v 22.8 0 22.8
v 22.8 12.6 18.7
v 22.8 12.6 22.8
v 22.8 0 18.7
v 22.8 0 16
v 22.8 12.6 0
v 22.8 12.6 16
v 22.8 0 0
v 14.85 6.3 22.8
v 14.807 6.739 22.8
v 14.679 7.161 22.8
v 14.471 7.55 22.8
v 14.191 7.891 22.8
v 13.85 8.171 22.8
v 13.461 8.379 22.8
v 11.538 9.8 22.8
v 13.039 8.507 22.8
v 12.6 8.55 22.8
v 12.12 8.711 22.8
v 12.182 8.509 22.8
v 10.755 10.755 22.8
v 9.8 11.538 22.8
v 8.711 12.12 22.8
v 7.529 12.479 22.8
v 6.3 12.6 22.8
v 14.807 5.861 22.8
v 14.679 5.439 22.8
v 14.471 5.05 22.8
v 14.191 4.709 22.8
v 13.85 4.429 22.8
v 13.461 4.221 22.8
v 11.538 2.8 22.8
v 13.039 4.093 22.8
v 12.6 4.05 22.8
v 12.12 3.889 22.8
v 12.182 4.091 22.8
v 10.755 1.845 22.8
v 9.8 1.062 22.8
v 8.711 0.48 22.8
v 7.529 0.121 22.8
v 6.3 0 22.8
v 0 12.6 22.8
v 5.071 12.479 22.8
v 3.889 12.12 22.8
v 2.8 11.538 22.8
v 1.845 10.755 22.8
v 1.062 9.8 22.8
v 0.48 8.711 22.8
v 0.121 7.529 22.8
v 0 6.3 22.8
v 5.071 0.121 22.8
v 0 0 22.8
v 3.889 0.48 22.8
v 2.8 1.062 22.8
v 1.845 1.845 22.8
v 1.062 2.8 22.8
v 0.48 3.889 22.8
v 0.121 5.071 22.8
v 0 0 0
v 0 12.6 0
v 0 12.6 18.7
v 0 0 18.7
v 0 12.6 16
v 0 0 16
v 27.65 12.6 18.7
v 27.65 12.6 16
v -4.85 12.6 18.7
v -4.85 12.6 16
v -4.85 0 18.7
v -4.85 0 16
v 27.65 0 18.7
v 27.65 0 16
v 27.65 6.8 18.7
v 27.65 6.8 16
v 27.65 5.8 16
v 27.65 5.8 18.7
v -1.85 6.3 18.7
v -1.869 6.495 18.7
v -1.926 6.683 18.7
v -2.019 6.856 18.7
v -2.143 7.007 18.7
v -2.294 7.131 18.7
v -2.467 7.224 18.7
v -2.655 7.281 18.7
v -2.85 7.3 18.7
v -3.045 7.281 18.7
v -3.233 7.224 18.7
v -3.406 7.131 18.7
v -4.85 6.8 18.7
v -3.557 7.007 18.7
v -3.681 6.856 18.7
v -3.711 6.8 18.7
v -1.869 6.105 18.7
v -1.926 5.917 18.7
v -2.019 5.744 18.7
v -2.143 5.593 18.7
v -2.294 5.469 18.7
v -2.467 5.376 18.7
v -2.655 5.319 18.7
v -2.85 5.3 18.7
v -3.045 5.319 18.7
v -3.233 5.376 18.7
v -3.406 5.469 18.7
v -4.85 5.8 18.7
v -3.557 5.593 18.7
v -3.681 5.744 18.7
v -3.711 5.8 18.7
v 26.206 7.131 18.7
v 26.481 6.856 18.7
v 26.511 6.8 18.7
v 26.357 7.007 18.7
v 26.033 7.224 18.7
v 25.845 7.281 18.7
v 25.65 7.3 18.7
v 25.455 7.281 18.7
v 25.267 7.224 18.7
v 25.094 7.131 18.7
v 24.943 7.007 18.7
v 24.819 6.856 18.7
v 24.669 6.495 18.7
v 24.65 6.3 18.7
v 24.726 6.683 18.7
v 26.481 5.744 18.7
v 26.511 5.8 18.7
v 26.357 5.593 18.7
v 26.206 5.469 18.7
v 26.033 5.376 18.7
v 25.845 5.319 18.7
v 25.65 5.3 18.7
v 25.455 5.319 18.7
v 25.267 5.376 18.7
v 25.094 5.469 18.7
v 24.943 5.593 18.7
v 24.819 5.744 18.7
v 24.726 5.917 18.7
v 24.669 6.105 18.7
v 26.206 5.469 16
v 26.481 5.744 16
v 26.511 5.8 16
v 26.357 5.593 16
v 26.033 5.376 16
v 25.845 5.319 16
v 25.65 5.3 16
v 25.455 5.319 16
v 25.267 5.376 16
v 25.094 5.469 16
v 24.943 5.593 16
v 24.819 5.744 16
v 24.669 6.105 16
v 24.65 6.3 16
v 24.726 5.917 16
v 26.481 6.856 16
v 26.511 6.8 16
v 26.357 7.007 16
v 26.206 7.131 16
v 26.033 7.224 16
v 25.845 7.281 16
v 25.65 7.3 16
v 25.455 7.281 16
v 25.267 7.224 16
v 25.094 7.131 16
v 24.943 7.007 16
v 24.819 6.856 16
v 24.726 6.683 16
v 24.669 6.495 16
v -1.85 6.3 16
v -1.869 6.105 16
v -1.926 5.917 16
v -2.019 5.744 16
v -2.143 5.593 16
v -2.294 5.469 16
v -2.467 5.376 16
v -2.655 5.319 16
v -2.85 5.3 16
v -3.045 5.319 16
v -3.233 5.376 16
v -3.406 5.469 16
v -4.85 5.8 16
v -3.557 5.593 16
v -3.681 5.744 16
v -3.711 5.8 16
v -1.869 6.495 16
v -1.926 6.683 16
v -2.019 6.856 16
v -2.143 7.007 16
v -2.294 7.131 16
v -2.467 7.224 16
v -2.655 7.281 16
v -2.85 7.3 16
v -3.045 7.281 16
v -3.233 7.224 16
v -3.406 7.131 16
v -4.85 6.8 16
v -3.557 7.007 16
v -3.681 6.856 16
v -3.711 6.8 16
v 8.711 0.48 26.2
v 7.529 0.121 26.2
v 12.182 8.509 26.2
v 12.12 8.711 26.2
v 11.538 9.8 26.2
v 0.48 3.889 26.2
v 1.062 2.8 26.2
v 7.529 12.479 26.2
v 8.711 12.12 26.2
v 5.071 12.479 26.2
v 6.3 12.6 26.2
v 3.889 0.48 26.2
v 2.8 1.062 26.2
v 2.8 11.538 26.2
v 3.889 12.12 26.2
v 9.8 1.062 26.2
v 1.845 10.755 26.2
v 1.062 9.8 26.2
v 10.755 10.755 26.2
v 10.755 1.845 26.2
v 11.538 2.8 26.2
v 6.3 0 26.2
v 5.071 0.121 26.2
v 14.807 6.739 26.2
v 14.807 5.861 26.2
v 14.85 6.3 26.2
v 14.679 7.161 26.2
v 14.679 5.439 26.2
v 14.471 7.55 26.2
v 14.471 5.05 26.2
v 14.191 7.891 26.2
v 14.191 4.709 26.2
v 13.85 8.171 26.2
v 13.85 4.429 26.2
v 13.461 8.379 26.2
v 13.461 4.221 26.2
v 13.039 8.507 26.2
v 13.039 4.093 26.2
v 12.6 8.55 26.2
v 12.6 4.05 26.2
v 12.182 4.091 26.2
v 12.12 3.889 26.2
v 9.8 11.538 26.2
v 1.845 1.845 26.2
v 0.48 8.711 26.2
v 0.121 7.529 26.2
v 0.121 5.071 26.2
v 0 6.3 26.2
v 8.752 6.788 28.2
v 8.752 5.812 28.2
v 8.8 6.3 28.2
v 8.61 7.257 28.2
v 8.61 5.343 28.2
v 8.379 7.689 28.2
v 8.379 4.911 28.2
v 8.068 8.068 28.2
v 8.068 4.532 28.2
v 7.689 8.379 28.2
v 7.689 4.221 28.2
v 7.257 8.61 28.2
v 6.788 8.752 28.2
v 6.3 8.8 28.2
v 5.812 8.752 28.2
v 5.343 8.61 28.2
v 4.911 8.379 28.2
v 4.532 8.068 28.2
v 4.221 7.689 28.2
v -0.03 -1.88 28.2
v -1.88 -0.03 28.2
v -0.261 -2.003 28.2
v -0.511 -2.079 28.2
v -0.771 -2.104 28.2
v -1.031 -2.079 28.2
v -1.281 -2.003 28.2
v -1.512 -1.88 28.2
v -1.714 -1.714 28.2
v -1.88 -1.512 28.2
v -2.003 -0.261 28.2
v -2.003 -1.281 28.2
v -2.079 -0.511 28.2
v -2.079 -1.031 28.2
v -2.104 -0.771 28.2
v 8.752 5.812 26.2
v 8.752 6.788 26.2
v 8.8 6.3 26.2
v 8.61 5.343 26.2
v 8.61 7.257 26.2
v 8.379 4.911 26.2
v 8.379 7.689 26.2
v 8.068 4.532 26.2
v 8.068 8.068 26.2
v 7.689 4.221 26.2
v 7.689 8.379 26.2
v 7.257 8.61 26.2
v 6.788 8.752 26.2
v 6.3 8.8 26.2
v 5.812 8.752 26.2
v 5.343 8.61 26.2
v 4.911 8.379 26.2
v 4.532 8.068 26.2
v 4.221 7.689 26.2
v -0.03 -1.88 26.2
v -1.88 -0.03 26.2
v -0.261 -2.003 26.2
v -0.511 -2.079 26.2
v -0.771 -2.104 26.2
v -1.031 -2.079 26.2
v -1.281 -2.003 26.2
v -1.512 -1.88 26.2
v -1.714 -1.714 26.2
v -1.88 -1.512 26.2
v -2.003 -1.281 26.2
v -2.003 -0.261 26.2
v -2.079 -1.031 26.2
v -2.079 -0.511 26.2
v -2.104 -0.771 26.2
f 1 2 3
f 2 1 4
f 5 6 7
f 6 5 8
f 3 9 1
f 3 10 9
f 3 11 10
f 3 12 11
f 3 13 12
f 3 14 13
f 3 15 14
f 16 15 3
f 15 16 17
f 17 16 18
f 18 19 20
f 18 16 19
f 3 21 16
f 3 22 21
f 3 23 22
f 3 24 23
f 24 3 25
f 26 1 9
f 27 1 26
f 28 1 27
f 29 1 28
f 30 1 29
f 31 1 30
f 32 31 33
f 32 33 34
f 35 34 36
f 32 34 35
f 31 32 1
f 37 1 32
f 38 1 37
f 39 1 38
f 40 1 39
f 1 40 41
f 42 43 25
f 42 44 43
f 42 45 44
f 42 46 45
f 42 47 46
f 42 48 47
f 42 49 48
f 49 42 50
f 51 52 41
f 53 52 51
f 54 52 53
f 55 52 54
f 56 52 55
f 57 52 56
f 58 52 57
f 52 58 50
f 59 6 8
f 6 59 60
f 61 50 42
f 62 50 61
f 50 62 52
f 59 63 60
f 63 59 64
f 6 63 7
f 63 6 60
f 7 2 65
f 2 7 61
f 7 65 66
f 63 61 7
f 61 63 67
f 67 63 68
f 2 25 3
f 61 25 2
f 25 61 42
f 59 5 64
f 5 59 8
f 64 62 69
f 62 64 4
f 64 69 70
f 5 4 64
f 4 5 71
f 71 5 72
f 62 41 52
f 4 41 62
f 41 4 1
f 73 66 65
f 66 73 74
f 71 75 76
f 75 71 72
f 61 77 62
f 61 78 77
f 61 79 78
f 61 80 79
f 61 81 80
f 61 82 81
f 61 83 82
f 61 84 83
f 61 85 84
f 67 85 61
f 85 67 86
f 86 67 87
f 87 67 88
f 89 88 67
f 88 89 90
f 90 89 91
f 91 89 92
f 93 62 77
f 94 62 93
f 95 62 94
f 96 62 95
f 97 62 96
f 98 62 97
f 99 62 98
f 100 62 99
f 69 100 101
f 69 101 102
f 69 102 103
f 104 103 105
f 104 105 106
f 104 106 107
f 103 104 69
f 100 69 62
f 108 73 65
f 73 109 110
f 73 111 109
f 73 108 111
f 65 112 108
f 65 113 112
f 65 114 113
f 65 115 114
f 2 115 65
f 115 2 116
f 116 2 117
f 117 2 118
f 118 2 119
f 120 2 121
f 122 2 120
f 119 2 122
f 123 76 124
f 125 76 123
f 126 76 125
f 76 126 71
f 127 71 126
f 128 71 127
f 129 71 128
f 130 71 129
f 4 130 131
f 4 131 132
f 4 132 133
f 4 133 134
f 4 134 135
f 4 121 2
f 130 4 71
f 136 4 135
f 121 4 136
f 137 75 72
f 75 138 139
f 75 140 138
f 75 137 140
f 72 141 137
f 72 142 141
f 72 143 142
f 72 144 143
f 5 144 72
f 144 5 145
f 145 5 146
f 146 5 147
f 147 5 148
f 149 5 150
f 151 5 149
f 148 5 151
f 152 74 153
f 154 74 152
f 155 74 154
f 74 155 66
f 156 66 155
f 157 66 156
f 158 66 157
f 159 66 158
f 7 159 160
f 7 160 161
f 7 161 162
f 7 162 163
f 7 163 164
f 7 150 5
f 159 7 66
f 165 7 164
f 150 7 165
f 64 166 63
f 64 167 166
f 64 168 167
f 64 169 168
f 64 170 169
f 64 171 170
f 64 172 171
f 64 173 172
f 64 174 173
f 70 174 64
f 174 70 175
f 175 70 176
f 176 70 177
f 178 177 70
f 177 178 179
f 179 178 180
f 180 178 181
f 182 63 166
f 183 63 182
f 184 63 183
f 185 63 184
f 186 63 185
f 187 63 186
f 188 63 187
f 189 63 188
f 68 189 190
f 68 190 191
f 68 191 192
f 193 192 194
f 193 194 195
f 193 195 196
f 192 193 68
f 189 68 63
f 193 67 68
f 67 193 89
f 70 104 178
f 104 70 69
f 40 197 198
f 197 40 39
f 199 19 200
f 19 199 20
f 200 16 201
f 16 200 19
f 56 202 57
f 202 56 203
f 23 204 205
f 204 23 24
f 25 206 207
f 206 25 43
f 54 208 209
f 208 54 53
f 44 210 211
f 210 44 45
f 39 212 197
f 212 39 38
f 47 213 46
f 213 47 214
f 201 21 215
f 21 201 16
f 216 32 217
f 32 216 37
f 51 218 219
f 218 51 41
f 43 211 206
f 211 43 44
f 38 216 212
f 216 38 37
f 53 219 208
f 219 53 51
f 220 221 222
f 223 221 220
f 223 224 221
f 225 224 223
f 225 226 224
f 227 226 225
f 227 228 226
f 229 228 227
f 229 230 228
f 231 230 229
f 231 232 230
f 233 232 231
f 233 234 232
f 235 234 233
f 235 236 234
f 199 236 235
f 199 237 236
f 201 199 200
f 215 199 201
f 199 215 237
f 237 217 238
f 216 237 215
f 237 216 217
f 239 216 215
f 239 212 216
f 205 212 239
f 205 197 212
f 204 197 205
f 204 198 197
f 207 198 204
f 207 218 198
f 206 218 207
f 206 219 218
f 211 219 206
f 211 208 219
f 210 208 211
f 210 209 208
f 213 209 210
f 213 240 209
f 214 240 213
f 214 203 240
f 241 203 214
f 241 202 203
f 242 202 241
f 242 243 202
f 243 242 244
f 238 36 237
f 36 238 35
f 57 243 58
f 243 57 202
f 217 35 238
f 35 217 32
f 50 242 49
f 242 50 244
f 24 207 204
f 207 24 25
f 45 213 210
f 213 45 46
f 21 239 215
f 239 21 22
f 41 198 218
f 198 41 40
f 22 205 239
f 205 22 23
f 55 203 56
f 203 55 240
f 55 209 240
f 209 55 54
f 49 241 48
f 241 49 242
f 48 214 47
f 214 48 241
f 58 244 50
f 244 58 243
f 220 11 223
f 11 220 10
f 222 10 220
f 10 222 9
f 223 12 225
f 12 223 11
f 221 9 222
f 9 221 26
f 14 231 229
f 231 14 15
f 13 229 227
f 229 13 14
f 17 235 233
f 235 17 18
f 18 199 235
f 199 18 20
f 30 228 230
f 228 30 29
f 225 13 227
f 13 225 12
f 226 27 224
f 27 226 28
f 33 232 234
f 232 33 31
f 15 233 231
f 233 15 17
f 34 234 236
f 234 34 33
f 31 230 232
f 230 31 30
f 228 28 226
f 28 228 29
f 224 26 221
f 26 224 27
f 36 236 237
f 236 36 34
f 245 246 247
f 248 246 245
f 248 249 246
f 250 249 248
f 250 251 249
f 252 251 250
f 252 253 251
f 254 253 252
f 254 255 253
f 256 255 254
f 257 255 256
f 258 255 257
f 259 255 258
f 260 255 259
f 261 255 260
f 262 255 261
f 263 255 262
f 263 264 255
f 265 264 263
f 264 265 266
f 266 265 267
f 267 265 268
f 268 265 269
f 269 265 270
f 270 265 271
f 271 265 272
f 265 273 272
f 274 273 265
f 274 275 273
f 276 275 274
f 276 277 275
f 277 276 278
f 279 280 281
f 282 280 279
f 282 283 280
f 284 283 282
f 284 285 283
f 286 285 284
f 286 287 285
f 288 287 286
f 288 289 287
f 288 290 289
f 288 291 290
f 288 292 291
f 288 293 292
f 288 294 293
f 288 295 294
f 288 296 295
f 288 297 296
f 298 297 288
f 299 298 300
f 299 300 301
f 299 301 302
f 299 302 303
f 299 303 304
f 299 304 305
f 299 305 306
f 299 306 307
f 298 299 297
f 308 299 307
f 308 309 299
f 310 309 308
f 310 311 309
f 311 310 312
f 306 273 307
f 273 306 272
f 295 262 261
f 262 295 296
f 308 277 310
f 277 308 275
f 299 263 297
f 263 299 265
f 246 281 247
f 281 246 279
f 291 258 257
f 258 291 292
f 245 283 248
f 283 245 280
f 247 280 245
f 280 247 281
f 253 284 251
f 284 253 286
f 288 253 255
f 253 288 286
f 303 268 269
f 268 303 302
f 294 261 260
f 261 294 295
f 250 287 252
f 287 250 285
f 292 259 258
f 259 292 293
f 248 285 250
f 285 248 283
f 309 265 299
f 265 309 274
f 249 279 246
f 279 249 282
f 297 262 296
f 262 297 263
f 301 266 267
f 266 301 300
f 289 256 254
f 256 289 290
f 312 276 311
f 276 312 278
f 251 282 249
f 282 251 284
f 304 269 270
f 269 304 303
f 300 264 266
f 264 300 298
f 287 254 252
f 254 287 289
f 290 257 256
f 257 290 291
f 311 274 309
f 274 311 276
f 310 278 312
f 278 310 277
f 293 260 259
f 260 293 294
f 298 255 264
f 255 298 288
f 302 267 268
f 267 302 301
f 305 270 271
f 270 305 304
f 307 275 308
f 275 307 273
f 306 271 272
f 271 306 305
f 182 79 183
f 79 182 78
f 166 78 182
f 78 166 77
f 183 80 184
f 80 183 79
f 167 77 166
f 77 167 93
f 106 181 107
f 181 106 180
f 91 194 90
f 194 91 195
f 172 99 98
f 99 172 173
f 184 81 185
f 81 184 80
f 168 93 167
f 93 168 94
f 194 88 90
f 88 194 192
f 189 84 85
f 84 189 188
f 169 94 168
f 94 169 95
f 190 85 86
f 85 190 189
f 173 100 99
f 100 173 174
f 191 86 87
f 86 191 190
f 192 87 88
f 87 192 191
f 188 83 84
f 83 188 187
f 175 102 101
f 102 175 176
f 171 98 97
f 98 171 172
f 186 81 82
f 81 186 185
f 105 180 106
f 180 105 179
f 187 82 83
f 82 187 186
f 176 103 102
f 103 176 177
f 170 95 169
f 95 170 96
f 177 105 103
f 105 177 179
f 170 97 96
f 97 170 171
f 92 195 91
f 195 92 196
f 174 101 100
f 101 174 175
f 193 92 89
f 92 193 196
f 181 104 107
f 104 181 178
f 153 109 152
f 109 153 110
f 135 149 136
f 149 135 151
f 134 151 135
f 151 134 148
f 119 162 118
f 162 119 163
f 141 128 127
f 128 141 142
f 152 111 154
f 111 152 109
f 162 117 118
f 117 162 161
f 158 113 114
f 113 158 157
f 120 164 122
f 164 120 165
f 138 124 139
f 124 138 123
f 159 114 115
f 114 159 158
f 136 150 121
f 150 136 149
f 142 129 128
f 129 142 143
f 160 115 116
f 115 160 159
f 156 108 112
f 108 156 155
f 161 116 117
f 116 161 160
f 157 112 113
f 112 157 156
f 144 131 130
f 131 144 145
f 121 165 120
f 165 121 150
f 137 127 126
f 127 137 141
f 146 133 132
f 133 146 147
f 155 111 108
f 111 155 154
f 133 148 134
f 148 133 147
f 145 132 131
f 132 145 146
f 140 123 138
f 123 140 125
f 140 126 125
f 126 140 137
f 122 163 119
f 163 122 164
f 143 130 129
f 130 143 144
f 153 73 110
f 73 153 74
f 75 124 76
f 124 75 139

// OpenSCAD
// servoSG90(fn) fn = è la definizione delle curve da usare nel render
module servoSG90(fn) {
//    fn=32;
    L = 22.8;
    l = 12.6;
    h = 22.8;
    plateL = 32.5;
    plateH = 2.7;
    plateHPos = 16;
    topCylinderH = 3.4;
    smallTopCylinderD = 4.5;
    
    axisH = 2;
    axisD = 4;
    
    screwHoleCenter=2;
    screwHoleD=2;
    holeSize=1;
    
    difference() {
        union() {
            color("Blue", 0.7) {
                // main part
                cube([L, l, h]);
                // support
                translate([-(plateL - L) / 2, 0, plateHPos])    cube([plateL, l, plateH]);
                // top big cylinder
                translate([l/2,l/2,h])  cylinder(d=l, h=topCylinderH, $fn=fn);
                // top small cylinder
                translate([l, l/2, h])  cylinder(d=smallTopCylinderD, h=topCylinderH, $fn=fn);
            }
            color("white")  translate([l/2,l/2, h + topCylinderH]) {
                cylinder(d=axisD,h=axisH, $fn=fn);
                hull() {        // -------------------------------------- rimuovere da qui------------------------
                    cylinder(d=axisD+1,h=axisH, $fn=fn);
                    rotate([0,0,-45-$t*45])translate ([0,-10,0]) cylinder(d=axisD*2/3,h=axisH, $fn=fn); //translate va inserita la lunghezza del braccio
                }               // ---------------------------a qui per rimuovere il braccio del servo -----------
            }
        }
        color("grey", 0.7) {
            // screwHole -
            translate([-(plateL - L) / 2 + screwHoleCenter, l/2, plateHPos])    cylinder(d=screwHoleD, h=10, $fn=fn, center=true);
            translate([-(plateL - L) / 2 - 1, l / 2 - holeSize / 2, plateHPos - 1]) cube([3,holeSize,4]);
            // screwHole +
            translate([plateL - (plateL - L) / 2 - screwHoleCenter, l / 2, plateHPos - 1])  cylinder(d=screwHoleD, h=10, $fn=fn, center=true);
            translate([plateL- (plateL - L) / 2 - screwHoleCenter, l / 2 - holeSize / 2, plateHPos -1]) cube([3,holeSize,4]);
        }
    }
}

servoSG90(32);
